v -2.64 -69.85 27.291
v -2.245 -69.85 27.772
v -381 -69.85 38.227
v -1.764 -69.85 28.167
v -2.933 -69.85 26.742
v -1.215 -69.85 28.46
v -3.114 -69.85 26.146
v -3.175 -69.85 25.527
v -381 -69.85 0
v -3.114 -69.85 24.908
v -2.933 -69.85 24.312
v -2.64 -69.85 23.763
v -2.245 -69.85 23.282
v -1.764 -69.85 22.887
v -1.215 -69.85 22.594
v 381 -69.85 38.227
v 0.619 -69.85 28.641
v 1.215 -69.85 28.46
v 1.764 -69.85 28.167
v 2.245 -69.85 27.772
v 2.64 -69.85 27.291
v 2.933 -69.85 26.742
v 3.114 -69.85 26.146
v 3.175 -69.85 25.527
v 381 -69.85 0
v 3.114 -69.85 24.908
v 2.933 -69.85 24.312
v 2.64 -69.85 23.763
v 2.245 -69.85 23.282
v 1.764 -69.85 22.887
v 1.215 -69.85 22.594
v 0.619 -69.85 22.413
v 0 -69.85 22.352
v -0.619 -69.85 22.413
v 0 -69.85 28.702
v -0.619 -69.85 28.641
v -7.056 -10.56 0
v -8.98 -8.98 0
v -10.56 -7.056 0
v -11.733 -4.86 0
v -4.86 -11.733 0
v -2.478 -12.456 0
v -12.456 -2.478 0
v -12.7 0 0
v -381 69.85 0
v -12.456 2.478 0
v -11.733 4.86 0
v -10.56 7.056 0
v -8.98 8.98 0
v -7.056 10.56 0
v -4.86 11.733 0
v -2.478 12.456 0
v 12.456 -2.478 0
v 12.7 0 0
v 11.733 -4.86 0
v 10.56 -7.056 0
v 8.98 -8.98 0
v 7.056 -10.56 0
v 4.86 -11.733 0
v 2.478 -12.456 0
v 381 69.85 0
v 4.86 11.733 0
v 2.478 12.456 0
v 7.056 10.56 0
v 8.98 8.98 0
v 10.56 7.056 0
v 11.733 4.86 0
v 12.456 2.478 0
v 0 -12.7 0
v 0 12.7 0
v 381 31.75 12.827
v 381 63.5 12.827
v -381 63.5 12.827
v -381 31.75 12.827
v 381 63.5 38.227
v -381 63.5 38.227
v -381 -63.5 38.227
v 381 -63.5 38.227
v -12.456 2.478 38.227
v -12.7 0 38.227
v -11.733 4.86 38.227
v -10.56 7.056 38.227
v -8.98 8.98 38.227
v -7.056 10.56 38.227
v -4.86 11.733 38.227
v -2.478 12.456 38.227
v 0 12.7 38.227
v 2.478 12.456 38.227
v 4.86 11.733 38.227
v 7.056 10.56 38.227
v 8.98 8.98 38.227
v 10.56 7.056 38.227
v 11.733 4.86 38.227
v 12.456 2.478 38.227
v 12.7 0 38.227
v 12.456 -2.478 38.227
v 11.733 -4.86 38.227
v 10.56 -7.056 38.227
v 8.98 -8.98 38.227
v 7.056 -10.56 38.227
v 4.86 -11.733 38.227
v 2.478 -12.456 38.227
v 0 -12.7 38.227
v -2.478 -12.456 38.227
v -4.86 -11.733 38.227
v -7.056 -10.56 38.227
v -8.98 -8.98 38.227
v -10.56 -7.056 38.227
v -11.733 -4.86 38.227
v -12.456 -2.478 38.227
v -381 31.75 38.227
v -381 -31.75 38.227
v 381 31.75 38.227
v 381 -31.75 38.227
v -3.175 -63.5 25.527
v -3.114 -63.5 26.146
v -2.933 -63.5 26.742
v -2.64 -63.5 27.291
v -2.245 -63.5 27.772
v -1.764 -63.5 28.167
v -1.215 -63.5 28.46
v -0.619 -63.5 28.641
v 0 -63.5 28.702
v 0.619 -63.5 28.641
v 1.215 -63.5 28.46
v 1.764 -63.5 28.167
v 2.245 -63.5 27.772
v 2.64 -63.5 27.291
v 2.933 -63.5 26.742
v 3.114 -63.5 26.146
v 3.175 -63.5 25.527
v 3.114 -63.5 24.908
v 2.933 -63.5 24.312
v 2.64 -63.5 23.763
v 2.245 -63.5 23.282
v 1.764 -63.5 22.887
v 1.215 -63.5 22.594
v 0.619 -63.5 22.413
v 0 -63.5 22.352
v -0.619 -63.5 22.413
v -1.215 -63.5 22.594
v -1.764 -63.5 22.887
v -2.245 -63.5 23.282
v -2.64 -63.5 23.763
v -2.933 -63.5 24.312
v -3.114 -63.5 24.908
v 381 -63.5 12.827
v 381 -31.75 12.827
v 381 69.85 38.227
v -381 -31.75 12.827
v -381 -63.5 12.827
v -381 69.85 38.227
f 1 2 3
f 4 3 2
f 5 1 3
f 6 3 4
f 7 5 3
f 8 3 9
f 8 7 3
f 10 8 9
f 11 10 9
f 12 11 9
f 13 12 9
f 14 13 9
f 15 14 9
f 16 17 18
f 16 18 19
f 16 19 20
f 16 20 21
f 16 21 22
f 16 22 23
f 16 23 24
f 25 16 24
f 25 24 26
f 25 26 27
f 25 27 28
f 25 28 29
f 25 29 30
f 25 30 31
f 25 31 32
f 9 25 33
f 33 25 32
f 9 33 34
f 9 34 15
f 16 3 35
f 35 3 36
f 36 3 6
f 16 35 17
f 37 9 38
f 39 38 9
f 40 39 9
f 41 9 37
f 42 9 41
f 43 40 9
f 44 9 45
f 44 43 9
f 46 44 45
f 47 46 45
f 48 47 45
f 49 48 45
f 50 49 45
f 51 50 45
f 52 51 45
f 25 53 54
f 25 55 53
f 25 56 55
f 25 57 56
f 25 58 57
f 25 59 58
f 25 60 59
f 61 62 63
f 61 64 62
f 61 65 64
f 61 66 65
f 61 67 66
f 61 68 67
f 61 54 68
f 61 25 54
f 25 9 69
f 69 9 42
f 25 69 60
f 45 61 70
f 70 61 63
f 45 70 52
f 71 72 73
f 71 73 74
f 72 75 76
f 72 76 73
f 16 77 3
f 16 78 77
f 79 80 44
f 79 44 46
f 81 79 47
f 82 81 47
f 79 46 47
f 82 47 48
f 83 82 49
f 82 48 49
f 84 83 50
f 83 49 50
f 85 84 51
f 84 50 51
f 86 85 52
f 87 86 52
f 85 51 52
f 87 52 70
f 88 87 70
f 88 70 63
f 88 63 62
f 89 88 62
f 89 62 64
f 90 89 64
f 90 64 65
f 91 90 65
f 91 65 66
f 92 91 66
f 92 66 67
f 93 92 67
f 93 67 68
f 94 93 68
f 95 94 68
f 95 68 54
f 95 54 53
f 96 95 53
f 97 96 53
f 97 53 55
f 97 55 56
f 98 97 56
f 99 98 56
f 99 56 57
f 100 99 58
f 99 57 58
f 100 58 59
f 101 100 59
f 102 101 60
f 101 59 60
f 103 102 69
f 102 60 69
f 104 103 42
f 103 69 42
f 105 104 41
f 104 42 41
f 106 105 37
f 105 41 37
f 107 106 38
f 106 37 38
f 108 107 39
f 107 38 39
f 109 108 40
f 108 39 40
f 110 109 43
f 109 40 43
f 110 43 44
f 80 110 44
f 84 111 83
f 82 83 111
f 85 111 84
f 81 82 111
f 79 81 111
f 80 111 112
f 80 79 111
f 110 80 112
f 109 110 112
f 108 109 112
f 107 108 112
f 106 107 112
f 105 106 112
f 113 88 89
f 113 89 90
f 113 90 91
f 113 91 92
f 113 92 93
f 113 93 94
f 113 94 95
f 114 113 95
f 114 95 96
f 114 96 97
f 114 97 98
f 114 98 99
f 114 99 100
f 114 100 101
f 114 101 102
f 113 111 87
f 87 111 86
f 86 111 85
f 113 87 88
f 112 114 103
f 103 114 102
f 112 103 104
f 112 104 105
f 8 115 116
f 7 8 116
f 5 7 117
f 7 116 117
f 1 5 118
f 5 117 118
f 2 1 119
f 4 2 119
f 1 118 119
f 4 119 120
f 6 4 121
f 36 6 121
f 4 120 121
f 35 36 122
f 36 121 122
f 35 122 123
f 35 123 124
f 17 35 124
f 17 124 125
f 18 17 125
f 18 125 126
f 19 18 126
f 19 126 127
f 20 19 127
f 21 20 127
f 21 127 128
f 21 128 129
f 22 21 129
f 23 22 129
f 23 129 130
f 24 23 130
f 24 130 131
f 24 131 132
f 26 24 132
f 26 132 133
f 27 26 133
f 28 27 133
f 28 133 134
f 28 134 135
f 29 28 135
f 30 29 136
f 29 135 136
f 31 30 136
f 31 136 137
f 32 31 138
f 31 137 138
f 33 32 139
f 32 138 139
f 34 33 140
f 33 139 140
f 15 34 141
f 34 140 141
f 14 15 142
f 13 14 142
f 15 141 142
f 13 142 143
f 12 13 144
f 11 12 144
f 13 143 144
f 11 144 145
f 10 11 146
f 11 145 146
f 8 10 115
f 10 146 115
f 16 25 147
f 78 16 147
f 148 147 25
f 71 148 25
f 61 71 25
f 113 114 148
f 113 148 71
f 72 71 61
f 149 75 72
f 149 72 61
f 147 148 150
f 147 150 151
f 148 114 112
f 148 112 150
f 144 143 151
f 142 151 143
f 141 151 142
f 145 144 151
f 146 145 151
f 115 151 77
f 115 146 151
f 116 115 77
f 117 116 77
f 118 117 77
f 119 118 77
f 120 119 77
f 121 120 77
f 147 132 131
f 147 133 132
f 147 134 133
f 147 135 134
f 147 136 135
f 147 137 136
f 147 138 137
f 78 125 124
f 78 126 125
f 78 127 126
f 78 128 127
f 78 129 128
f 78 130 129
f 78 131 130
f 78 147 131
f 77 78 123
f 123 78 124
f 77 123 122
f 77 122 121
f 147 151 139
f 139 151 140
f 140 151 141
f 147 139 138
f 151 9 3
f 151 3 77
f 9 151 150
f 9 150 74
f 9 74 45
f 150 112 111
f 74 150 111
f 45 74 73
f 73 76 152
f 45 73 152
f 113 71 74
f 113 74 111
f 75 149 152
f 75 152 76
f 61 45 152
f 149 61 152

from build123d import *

# Parameters (mm, degrees)
F1_DEPTH      = 381
F1_DEPTH_BACK = 381
F3_D          = 6.35
F3_DEPTH      = 6.35
F5_D          = 25.4


with BuildPart() as f1:
    # F0 (on Right) → F1 (new body, two sides)
    with BuildSketch(Plane.YZ) as f1_sk:
        Polygon((-69.85, 38.227), (-69.85, 0), (69.85, 0), (69.85, 38.227), (63.5, 38.227), (63.5, 12.827), (31.75, 12.827), (31.75, 38.227), (-31.75, 38.227), (-31.75, 12.827), (-63.5, 12.827), (-63.5, 38.227), align=None)
    extrude(amount=F1_DEPTH)
    extrude(f1_sk.sketch, amount=-F1_DEPTH_BACK)

    # F3
    with Locations(Plane.XZ.offset(69.85)):
        with Locations((0, 25.527)):
            Hole(F3_D / 2, depth=F3_DEPTH)

    # F5 (through all)
    with Locations(Plane.XY.offset(38.227)):
        with Locations((0, 0)):
            Hole(F5_D / 2)


solid = f1.part
